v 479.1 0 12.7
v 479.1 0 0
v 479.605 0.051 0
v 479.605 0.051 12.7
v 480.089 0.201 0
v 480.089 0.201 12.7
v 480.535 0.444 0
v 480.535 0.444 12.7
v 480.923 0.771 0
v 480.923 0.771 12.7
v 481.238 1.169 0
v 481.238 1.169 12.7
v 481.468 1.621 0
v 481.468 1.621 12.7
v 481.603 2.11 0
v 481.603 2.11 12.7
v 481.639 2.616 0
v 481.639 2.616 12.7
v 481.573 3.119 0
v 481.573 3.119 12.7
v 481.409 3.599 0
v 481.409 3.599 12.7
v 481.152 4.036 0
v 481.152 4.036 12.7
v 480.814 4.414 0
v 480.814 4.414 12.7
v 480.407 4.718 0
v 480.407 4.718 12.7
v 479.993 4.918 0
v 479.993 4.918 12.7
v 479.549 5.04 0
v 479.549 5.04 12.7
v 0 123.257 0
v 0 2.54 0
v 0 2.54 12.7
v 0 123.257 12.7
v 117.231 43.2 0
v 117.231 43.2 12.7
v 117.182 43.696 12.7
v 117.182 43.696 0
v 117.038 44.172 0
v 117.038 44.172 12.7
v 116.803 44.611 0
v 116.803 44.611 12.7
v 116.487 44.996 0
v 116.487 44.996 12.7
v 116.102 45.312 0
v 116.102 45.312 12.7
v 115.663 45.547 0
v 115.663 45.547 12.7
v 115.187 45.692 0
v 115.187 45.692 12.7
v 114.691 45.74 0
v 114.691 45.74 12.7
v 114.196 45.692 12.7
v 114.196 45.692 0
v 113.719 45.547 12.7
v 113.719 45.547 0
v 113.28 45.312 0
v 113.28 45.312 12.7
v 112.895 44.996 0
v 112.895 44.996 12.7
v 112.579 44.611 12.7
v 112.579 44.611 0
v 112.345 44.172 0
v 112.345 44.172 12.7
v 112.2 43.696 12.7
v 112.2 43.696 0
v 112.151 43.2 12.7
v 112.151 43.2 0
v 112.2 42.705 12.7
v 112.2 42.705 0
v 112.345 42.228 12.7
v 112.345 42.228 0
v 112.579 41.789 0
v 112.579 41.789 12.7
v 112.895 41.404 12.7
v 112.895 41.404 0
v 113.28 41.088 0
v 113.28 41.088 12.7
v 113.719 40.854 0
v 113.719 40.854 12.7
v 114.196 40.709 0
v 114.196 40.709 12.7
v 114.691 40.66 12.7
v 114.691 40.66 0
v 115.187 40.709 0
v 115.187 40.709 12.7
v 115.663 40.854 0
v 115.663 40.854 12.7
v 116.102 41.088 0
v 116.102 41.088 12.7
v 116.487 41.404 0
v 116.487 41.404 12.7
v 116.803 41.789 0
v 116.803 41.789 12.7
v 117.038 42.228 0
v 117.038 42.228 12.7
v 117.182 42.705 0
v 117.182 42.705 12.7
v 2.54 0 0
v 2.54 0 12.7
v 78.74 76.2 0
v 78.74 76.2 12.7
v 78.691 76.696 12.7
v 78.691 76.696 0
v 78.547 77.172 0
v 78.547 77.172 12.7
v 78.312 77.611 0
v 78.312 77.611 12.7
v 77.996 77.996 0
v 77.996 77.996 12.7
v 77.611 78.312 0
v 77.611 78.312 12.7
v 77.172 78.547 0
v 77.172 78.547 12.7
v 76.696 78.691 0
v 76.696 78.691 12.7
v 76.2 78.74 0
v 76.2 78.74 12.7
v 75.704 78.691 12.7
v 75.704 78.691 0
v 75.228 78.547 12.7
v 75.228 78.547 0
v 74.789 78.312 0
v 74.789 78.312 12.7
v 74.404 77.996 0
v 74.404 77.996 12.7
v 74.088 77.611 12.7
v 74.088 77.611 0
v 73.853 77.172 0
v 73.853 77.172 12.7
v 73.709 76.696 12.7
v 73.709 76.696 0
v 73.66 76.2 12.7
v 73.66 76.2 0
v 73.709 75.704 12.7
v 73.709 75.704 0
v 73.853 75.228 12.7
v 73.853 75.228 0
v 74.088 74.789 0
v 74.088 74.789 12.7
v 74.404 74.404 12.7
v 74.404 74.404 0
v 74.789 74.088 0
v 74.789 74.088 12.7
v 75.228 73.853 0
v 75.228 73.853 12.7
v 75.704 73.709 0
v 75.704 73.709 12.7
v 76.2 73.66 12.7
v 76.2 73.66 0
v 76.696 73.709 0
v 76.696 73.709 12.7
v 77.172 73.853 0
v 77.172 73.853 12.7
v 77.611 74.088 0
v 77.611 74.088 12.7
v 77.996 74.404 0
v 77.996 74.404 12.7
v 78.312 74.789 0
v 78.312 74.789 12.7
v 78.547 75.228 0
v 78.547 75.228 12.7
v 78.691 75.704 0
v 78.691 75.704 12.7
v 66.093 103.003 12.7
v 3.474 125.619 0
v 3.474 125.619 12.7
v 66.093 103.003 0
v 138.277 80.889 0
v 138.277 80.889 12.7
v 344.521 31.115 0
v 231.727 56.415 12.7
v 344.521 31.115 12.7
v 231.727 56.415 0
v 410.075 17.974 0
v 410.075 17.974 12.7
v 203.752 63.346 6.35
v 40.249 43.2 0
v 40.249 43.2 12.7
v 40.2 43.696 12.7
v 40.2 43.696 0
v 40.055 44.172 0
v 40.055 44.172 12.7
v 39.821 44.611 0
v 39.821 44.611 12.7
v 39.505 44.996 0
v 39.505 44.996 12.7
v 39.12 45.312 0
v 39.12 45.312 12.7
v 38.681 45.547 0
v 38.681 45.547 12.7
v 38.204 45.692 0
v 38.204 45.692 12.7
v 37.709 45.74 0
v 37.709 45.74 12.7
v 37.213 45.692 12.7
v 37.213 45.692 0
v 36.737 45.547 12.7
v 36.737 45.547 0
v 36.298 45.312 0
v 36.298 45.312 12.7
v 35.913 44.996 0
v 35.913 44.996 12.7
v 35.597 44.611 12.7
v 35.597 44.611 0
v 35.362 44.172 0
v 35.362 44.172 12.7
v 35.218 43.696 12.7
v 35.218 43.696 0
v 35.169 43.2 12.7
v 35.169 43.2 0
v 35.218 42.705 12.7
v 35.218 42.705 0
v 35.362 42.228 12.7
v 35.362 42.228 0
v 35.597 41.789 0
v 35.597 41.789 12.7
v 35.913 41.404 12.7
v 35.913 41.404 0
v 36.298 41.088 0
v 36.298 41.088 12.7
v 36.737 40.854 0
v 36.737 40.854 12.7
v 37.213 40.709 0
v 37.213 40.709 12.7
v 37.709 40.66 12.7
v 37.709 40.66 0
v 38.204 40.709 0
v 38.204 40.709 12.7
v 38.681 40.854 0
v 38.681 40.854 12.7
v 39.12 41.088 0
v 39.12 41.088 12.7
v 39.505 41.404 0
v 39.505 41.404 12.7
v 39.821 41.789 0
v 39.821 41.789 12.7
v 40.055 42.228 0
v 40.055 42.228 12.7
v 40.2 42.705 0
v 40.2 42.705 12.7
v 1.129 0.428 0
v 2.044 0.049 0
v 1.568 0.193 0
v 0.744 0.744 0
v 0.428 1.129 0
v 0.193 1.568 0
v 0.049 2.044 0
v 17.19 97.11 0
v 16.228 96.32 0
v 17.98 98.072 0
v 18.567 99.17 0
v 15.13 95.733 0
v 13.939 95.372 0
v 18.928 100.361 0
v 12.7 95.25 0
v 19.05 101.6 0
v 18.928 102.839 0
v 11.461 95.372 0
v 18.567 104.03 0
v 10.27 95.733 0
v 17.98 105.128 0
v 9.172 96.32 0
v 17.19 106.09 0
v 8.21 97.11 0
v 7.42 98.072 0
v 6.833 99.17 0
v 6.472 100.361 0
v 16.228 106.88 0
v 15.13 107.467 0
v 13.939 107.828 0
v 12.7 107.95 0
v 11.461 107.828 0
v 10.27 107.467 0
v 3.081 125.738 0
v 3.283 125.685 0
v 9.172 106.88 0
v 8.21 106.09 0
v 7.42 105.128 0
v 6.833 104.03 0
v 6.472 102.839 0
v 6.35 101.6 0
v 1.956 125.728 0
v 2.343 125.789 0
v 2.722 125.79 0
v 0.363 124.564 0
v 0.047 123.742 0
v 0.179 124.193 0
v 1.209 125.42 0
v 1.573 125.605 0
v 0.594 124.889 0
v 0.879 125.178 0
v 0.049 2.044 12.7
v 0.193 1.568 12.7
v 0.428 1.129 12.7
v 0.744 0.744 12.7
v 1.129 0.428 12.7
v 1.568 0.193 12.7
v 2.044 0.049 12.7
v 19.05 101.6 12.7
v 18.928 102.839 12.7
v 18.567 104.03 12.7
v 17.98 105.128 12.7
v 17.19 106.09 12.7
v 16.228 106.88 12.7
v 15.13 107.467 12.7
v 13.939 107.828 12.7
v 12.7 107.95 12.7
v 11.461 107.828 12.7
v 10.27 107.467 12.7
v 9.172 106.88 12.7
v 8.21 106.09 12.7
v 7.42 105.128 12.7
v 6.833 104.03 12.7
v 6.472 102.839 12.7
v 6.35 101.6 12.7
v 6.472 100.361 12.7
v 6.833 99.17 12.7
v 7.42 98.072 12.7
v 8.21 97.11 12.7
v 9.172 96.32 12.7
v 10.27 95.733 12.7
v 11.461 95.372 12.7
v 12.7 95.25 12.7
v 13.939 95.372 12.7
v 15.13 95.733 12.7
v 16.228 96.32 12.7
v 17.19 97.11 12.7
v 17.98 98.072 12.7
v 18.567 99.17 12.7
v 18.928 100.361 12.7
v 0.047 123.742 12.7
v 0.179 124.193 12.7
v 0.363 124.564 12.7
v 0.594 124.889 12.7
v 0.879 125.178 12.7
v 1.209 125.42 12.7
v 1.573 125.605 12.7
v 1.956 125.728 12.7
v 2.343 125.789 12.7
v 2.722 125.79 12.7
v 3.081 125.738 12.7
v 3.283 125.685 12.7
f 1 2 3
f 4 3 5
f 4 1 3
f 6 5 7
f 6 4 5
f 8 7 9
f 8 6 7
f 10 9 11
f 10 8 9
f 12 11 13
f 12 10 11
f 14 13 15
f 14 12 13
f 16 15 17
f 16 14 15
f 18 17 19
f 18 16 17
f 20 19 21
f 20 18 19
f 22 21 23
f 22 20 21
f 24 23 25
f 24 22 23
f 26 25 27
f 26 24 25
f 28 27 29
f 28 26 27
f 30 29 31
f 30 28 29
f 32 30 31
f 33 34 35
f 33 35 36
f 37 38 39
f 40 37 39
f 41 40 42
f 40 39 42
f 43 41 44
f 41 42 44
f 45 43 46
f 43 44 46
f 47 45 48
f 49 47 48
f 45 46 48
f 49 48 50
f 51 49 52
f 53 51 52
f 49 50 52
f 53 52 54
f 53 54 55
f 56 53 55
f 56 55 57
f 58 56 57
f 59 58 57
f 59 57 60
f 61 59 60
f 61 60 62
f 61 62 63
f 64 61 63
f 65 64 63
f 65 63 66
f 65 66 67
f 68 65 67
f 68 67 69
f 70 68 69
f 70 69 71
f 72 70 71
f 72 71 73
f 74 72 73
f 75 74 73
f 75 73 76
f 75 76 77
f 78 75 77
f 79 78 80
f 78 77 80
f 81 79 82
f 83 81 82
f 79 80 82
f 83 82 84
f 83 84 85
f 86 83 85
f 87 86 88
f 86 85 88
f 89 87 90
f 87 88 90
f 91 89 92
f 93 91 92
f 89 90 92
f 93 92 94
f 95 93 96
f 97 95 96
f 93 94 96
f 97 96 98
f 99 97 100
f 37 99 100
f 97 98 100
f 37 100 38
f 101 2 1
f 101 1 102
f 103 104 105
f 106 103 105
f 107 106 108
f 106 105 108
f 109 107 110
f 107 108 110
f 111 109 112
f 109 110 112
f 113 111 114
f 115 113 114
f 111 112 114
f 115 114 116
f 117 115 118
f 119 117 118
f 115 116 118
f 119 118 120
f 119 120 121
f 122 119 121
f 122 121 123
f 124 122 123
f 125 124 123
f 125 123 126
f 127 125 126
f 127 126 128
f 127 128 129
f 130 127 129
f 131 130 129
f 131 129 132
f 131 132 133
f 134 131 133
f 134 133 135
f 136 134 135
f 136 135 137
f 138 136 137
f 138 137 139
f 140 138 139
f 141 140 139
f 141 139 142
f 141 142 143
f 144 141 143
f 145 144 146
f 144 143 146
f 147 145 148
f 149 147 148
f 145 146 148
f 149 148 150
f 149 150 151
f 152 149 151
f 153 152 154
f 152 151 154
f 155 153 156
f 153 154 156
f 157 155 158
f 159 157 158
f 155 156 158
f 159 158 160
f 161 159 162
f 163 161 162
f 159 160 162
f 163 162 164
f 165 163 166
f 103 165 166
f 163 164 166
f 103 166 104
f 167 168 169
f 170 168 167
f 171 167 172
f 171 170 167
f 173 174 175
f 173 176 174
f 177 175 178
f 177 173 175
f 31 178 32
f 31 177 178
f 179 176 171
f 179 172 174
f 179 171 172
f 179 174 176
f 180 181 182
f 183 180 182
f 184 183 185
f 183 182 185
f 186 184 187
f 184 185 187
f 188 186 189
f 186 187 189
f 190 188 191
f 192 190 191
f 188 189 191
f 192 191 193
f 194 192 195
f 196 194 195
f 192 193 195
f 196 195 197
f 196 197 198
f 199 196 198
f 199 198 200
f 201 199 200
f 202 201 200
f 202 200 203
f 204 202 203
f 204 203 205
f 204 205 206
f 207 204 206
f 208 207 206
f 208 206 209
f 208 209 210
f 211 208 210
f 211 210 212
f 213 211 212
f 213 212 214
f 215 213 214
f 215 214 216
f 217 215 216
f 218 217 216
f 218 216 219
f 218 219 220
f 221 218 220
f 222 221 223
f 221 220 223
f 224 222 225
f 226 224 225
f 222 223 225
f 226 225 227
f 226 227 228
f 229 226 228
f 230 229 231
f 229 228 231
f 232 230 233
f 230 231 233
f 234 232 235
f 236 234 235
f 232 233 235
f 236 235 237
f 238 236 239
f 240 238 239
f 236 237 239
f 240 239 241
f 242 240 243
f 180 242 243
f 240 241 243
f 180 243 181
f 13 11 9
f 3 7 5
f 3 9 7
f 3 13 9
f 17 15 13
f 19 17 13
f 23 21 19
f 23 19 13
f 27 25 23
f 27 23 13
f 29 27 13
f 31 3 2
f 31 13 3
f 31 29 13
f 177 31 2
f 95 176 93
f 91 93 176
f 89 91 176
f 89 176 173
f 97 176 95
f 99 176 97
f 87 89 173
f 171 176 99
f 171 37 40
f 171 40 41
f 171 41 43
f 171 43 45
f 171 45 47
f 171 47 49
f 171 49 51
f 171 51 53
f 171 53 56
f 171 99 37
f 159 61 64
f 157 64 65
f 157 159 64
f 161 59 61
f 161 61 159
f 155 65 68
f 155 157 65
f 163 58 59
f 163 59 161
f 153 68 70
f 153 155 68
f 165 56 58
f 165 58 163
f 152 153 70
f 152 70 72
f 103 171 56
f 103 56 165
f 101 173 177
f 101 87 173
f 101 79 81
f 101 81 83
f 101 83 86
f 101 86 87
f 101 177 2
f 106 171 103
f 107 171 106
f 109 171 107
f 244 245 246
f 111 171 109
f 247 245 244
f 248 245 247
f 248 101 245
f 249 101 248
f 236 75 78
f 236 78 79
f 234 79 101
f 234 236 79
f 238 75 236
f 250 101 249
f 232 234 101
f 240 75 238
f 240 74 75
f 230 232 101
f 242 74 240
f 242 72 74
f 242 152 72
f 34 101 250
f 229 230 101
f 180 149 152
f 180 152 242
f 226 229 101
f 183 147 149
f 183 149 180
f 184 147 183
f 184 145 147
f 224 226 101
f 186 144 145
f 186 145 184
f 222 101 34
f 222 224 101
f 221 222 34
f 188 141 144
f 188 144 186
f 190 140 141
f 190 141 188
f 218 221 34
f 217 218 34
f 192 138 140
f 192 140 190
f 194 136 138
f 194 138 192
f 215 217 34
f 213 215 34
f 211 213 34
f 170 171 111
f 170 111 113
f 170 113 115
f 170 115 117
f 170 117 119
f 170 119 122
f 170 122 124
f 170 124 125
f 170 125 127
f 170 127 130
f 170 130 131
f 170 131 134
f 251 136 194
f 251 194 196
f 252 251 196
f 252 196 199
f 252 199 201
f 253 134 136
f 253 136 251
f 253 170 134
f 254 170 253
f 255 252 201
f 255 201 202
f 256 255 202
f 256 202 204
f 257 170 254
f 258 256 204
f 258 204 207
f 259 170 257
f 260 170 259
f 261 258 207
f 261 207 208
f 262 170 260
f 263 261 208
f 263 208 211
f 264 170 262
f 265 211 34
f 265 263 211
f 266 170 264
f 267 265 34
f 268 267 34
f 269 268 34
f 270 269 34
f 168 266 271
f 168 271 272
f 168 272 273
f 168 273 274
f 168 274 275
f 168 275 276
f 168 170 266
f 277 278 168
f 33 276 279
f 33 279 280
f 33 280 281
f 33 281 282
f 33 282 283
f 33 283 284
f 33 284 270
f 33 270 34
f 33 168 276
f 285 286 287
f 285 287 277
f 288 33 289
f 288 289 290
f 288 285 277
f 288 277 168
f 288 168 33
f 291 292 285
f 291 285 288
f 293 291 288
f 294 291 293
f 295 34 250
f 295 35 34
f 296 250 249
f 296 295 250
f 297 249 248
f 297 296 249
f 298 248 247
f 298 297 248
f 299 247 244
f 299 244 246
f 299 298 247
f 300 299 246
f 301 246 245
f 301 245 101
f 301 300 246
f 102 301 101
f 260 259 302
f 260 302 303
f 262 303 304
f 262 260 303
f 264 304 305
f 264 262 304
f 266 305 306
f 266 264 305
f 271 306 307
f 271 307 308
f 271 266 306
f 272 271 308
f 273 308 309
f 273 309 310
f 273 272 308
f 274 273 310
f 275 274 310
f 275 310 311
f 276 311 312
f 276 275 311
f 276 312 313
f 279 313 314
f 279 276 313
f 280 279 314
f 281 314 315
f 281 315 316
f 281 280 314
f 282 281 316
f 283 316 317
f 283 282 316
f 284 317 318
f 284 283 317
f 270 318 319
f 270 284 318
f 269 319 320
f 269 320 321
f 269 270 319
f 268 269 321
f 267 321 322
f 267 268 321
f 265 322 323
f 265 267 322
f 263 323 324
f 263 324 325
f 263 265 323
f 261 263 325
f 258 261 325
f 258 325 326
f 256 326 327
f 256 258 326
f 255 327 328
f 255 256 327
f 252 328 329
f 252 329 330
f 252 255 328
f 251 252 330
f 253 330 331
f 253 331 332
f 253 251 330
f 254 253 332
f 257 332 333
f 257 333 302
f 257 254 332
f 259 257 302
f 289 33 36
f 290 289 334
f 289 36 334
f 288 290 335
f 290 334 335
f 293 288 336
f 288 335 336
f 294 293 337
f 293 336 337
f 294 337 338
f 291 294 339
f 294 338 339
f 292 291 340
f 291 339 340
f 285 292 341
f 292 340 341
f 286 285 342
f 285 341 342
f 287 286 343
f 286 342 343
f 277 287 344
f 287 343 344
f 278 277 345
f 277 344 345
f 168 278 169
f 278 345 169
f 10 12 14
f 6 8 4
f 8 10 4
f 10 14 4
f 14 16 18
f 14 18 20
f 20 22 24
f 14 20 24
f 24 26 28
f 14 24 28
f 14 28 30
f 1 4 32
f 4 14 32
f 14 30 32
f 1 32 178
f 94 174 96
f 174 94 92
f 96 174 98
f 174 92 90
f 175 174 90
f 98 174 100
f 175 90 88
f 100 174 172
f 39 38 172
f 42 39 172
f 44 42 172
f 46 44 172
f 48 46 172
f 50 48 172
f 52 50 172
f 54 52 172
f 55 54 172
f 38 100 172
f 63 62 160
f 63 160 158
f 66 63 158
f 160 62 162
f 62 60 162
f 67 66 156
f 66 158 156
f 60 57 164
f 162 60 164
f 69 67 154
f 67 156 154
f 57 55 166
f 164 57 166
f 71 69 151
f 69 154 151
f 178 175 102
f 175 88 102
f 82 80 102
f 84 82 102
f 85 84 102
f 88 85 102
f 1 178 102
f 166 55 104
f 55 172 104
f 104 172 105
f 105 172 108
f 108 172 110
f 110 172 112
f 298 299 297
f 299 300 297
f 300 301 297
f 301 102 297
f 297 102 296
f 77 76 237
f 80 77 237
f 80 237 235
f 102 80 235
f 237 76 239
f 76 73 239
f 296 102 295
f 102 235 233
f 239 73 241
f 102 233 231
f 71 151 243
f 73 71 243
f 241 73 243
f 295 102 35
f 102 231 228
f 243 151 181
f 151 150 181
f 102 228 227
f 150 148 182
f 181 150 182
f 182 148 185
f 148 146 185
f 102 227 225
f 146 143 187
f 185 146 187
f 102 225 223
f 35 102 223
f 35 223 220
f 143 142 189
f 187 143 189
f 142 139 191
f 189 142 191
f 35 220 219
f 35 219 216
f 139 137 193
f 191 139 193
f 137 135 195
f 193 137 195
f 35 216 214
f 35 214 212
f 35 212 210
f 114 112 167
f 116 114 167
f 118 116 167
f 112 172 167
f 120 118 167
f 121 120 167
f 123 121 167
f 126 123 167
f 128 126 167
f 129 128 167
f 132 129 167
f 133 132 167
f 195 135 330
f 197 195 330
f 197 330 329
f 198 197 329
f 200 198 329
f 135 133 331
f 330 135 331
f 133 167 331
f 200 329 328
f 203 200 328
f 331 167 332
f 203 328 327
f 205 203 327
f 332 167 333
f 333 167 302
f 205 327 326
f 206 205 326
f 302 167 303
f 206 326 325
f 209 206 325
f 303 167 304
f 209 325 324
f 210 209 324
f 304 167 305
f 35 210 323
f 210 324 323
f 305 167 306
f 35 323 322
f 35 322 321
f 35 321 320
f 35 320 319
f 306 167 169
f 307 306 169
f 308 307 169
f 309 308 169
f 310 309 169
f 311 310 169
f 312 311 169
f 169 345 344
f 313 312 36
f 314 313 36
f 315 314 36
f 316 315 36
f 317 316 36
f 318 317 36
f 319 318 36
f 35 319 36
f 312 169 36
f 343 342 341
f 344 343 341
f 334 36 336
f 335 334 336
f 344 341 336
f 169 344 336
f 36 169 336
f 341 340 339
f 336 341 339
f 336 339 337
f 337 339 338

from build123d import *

# Parameters (mm, degrees)
SKETCH1_R           = 6.35
BOSS_EXTRUDE1_DEPTH = 12.7
FILLET1_R           = 2.54
FILLET2_R           = 2.54
SKETCH2_R           = 2.54
CUT_EXTRUDE1_DEPTH  = 203.2


with BuildPart() as part:
    # Sketch1 → Boss-Extrude1 (new body)
    with BuildSketch(Plane.XY):
        with BuildLine():
            Line((0, 0), (0, 127))
            add(Edge.make_bspline(
                [(0, 127), (169.846972044, 59.080713691), (508, 0)],
                knots=[0, 0, 0, 1, 1, 1], degree=2))
            Line((508, 0), (0, 0))
        make_face()
        with Locations((12.7, 101.6)):
            Circle(SKETCH1_R, mode=Mode.SUBTRACT)
    extrude(amount=BOSS_EXTRUDE1_DEPTH)

    # Fillet1
    fillet1_edges = [part.edges().sort_by_distance(p)[0] for p in [
        (0, 127, 6.35),
    ]]
    fillet(fillet1_edges, radius=FILLET1_R)

    # Fillet2
    fillet2_edges = [part.edges().sort_by_distance(p)[0] for p in [
        (0, 0, 6.35),
        (508, 0, 6.35),
    ]]
    fillet(fillet2_edges, radius=FILLET2_R)

    # Sketch2 → Cut-Extrude1 (cut)
    with BuildSketch(Plane.XY.offset(12.7)):
        with Locations((76.2, 76.2)):
            Circle(SKETCH2_R)
        with Locations((37.70884, 43.20032)):
            Circle(SKETCH2_R)
        with Locations((114.69116, 43.20032)):
            Circle(SKETCH2_R)
    extrude(amount=-CUT_EXTRUDE1_DEPTH, mode=Mode.SUBTRACT)


solid = part.part
